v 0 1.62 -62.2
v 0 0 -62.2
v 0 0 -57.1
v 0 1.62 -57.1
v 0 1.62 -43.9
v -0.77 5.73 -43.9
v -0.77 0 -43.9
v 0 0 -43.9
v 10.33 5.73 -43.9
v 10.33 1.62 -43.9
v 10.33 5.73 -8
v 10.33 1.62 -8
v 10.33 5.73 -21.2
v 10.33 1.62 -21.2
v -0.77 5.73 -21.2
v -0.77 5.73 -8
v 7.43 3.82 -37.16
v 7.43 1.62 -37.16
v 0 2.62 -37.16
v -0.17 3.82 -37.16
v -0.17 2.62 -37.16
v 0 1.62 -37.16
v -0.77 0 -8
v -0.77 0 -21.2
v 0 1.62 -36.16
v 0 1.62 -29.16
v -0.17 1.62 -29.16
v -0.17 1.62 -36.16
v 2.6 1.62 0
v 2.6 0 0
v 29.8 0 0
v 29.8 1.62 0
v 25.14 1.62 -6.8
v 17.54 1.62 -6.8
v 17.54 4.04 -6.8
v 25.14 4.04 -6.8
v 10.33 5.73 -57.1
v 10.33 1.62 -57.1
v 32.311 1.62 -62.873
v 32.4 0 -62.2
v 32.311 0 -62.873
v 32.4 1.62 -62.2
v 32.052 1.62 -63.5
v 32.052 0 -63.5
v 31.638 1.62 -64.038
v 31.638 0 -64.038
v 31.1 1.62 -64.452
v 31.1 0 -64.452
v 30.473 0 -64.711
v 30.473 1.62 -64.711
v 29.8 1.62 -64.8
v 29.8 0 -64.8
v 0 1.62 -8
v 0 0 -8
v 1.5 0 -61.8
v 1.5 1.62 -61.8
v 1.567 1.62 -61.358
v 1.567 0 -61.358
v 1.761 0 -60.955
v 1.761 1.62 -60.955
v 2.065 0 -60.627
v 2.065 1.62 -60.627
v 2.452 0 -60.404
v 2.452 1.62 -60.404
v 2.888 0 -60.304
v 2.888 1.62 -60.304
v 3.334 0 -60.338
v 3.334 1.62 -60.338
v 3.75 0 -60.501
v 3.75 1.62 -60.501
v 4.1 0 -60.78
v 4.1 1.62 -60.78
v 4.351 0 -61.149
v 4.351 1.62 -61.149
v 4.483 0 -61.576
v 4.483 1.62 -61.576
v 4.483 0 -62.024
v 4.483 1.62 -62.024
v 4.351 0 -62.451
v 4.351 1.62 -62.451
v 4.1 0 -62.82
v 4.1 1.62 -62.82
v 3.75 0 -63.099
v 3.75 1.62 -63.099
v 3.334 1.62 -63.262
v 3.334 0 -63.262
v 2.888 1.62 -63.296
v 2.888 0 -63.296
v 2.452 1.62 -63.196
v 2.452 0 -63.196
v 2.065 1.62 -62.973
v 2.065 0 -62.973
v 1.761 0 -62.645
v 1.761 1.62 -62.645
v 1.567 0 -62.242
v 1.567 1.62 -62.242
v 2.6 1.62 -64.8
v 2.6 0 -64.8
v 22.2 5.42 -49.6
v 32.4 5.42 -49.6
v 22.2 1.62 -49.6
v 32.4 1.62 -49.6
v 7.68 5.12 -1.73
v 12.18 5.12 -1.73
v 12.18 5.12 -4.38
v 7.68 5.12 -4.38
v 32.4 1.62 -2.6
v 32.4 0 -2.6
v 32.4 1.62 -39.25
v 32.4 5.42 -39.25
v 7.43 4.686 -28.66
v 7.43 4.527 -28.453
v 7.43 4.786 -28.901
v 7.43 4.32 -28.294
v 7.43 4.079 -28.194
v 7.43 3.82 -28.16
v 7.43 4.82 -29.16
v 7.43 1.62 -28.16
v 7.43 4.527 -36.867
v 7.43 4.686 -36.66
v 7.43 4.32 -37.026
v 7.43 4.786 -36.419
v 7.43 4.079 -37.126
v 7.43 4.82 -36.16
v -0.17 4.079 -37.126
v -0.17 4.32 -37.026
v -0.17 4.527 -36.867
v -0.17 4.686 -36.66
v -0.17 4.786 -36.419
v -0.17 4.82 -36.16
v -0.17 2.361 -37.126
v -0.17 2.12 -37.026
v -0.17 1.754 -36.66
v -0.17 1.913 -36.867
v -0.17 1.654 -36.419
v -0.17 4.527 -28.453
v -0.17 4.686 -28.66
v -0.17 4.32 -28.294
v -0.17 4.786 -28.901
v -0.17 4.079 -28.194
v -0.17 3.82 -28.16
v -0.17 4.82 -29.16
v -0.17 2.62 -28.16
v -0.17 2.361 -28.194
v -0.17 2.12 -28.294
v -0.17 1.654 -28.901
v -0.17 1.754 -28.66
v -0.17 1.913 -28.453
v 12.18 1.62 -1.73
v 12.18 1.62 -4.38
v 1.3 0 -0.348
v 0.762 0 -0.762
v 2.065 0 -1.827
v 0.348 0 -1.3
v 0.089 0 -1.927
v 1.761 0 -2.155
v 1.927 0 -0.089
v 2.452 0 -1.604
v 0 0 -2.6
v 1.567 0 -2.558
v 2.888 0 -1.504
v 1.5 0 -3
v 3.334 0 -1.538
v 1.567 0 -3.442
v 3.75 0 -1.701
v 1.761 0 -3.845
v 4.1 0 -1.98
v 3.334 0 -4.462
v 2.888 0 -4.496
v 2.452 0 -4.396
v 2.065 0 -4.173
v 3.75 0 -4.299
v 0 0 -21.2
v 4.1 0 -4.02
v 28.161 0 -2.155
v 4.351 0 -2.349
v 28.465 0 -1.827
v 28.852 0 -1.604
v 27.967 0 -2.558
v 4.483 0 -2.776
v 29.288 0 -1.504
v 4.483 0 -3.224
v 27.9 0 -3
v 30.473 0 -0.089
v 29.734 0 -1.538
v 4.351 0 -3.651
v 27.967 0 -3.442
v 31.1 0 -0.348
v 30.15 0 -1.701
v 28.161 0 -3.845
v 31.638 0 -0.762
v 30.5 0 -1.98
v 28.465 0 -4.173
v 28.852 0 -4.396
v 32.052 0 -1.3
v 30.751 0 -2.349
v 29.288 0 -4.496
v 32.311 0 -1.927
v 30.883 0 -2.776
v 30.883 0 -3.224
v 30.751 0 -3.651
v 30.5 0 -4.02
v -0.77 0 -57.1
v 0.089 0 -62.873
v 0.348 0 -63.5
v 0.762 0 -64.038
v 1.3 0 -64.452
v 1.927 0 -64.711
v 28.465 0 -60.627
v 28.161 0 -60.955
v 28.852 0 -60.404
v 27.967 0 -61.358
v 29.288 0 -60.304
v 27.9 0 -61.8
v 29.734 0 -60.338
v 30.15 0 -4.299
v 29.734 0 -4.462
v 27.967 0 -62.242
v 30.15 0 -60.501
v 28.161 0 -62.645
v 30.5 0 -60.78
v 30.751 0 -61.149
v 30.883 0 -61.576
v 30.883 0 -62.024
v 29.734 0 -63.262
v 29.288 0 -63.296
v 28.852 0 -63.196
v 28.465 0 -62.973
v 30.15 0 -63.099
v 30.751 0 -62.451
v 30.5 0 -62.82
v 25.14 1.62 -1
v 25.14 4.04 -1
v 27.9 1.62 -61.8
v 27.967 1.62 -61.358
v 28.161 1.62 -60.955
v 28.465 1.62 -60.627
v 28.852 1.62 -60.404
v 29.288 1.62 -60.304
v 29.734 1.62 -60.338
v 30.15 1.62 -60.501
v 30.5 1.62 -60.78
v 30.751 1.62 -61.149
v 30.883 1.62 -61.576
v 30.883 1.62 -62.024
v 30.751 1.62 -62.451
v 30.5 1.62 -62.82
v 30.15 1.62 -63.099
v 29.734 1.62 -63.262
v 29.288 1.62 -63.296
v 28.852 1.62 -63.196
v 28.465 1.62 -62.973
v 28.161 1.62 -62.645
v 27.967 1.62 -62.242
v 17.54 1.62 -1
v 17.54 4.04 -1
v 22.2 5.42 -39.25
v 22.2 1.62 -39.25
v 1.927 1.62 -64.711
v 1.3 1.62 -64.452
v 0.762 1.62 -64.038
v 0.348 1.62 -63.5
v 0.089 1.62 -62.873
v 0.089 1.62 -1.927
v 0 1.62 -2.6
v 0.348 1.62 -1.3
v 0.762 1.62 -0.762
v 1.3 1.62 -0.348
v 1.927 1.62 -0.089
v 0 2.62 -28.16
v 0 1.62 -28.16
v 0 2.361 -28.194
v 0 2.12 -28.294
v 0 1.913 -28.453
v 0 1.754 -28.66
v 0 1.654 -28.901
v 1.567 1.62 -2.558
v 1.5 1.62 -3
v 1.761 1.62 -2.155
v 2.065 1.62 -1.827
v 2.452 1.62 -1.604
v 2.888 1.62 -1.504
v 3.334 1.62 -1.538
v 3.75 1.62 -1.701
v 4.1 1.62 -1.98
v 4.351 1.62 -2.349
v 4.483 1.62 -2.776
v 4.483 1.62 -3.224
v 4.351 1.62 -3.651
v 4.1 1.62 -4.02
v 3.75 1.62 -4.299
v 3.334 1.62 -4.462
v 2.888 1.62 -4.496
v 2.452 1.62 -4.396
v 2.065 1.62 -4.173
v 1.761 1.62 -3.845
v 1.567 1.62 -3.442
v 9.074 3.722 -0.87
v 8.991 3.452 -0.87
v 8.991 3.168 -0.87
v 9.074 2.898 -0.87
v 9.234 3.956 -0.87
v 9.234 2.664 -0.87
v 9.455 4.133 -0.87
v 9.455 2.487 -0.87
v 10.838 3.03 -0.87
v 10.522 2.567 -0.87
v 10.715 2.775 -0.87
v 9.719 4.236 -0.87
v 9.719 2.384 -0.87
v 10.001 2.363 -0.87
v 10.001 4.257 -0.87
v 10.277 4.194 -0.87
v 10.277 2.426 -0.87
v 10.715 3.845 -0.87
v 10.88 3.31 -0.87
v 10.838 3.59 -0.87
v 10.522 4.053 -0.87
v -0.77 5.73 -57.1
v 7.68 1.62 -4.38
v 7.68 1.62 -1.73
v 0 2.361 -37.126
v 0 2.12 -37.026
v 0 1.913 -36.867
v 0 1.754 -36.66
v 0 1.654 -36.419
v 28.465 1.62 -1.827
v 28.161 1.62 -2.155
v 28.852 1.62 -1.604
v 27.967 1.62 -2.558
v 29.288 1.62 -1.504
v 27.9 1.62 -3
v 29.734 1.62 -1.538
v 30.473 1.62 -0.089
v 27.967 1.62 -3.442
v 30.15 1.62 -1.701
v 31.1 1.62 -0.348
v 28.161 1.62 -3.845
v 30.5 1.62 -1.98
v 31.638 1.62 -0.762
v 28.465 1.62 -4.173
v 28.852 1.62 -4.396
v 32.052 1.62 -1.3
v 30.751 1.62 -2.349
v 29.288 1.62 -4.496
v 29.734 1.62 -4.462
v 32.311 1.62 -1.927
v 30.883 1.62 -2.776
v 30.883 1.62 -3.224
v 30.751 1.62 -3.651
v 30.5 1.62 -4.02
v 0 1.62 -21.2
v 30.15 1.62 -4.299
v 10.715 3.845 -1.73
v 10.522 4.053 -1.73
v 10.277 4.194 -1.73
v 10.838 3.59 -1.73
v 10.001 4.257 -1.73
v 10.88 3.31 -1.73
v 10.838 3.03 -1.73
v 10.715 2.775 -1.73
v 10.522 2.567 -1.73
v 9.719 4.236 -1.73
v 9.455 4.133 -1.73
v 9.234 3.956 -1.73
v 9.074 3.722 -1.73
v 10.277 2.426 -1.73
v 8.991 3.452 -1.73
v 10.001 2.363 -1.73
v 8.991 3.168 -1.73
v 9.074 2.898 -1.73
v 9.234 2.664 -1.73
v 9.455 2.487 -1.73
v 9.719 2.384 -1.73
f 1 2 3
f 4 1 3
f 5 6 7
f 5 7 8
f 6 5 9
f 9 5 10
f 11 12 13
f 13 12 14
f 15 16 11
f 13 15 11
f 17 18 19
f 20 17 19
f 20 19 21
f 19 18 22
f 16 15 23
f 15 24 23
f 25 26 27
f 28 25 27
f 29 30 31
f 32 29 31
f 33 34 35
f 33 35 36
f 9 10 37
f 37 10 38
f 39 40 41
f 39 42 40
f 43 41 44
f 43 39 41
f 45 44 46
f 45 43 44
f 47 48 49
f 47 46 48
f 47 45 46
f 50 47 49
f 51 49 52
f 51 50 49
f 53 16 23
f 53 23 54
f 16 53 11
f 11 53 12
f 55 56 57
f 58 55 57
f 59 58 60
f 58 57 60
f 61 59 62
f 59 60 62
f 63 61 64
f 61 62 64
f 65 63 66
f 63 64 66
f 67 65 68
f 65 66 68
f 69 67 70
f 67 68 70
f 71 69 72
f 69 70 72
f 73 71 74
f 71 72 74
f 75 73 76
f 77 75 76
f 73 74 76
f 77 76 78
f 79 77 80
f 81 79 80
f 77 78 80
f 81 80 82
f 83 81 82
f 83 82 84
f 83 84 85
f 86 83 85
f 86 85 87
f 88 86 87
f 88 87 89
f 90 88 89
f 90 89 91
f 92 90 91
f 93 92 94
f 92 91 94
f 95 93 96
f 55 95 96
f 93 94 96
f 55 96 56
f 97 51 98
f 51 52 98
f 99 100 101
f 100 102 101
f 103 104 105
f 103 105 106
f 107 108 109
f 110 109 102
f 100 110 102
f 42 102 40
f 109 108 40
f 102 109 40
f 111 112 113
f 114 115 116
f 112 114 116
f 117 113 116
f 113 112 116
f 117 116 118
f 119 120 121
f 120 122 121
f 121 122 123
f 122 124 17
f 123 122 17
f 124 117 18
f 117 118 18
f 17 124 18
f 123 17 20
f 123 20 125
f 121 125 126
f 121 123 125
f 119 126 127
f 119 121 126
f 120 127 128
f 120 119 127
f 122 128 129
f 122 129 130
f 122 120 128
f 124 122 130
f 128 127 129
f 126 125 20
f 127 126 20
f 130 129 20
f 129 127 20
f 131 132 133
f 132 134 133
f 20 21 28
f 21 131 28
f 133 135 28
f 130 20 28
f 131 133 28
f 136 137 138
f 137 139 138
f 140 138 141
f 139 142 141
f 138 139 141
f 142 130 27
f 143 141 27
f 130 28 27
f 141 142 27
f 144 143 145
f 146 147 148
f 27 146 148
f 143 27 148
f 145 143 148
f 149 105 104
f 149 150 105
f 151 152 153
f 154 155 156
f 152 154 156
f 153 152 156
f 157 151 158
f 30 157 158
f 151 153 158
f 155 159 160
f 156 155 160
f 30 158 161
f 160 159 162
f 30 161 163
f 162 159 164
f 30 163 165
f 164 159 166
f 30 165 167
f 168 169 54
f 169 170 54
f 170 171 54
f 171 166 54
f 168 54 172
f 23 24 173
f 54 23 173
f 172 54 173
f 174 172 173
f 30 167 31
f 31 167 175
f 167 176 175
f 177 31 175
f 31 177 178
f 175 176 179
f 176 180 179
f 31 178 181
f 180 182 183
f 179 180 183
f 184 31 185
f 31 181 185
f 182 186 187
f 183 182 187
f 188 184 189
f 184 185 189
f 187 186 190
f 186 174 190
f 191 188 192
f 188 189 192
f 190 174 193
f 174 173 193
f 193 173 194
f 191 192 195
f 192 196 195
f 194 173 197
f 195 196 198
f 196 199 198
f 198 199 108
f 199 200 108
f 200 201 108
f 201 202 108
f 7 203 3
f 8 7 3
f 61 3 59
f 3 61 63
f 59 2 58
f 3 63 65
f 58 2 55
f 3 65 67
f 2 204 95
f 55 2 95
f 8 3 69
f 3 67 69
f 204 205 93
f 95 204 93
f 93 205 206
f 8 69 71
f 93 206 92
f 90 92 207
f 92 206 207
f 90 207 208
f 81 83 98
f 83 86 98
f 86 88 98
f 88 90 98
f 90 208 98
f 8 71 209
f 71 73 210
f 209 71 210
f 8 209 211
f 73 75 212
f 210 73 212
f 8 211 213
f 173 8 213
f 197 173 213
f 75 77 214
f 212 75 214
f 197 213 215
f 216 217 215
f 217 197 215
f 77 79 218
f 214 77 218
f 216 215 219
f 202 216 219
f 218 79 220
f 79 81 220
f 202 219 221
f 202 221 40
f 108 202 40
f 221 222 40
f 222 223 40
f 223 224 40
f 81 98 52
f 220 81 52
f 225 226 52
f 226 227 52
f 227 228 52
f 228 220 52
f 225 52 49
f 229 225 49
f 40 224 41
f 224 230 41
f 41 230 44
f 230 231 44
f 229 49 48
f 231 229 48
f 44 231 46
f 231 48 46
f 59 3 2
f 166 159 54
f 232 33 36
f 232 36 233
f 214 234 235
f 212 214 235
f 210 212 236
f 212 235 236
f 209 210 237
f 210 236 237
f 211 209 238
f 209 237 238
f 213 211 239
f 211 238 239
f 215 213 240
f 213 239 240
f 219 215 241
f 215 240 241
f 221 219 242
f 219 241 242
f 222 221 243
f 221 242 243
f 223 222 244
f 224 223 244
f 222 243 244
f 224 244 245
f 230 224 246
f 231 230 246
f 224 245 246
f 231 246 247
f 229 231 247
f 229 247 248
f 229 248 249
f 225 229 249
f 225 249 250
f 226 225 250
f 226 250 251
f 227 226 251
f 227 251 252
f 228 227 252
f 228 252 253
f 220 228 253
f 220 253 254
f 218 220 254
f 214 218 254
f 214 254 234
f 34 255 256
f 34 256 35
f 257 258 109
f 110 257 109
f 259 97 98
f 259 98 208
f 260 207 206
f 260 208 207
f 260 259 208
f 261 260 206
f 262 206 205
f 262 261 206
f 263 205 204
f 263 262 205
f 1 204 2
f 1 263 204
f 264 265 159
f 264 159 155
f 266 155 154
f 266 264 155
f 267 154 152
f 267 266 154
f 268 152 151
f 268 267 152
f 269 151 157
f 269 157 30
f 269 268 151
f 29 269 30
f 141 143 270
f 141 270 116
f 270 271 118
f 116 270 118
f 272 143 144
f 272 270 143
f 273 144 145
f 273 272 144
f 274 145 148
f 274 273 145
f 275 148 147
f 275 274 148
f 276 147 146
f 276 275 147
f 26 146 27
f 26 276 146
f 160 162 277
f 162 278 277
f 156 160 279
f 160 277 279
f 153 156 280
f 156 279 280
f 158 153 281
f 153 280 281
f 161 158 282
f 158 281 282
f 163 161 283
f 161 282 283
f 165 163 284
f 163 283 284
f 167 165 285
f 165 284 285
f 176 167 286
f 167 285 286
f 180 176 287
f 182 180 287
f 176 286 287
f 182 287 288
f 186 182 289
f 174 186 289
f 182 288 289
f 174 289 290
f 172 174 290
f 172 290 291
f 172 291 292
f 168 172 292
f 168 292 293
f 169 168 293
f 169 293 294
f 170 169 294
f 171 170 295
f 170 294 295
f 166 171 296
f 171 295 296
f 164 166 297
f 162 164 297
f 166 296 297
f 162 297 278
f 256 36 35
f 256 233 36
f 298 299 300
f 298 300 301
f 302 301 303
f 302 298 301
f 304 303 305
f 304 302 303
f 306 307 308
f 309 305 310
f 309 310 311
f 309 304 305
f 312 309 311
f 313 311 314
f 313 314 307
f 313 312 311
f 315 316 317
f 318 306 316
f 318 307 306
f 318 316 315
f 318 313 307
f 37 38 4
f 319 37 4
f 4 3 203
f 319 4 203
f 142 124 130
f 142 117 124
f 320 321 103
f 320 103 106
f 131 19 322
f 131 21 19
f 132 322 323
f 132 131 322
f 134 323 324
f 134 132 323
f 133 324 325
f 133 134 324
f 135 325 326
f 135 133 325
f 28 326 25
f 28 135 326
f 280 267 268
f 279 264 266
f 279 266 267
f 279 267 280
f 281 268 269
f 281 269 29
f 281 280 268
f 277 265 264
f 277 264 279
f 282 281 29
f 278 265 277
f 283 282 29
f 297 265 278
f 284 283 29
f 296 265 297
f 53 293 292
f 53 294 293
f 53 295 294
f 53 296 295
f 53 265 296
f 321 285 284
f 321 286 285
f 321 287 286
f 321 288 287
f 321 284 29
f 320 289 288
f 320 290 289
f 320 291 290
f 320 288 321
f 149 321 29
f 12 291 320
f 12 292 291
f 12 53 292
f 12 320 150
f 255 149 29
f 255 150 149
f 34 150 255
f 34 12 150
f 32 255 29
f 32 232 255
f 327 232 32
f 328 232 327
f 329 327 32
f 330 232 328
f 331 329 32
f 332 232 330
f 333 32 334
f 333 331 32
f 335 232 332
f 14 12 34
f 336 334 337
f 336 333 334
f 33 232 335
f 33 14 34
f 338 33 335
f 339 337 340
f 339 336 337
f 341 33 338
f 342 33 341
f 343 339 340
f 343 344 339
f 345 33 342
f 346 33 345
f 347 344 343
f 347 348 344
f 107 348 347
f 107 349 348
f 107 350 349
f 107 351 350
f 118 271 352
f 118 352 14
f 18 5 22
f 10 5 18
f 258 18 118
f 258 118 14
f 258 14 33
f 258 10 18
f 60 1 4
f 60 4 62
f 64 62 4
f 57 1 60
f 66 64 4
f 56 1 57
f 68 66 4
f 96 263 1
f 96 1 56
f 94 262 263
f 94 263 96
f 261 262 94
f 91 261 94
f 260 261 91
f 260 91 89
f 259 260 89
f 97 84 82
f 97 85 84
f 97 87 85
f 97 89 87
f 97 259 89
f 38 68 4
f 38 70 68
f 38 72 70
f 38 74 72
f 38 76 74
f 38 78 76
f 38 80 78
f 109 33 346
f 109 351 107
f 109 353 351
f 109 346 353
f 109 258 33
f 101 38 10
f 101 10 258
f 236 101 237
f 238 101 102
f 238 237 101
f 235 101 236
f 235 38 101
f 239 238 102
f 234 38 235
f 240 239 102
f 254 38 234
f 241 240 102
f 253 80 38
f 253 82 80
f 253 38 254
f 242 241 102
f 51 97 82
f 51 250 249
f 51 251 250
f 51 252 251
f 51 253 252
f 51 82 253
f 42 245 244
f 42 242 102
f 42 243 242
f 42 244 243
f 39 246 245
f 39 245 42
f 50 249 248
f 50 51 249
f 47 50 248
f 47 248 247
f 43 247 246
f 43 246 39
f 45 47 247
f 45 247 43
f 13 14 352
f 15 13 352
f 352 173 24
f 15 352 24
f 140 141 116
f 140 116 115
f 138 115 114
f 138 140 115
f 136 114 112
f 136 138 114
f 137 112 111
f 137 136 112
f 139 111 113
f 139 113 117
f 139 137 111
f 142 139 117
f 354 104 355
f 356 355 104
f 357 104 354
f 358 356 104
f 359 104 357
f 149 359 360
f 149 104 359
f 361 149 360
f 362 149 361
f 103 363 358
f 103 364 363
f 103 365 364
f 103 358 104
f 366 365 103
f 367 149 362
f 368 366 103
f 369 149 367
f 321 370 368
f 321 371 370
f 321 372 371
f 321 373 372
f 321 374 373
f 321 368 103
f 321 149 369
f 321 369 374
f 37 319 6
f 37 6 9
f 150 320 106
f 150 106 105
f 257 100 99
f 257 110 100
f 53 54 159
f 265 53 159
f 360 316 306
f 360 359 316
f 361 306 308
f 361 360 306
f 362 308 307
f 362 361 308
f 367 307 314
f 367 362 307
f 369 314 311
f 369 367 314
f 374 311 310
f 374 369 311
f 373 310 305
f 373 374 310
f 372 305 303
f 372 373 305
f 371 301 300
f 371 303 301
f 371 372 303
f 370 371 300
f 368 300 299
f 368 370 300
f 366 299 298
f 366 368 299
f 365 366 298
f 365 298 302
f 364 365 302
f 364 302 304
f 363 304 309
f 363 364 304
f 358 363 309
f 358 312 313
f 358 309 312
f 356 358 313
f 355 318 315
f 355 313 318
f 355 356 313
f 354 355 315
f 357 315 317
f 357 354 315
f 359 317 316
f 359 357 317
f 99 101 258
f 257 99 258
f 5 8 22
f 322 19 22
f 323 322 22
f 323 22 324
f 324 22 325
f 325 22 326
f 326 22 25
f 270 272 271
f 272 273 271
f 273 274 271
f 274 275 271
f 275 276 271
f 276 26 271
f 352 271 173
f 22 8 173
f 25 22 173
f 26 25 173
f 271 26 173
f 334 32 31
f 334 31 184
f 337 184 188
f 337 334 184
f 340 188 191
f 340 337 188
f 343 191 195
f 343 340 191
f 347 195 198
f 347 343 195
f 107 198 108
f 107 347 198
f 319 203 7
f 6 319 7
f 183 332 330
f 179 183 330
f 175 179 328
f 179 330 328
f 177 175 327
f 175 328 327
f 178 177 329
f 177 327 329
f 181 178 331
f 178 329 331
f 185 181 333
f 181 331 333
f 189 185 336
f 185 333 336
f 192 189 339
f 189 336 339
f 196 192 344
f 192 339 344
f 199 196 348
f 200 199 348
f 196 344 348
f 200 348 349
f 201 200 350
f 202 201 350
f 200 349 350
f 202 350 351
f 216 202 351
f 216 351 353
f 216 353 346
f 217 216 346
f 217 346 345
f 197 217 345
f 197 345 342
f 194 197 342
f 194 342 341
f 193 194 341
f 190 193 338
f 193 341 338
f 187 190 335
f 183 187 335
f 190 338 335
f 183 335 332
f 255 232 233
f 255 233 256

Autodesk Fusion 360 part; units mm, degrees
sketch "Sketch1" plane through (0, 0, 0) normal (0, 1, 0) x (1, 0, 0)
  line L0 (0, 0) -> (32.4, 0)
  line L1 (32.4, 0) -> (32.4, 64.8)
  line L2 (32.4, 64.8) -> (0, 64.8)
  line L3 (0, 64.8) -> (0, 0)
  dimension "d1" = 64.8
  dimension "d2" = 32.4
extrude "Extrude1" add sketch "Sketch1" along normal blind 1.62
fillet "Fillet1" radius 2.6 4 edges at (0, 0.81, 0) (32.4, 0.81, 0) (0, 0.81, -64.8) (32.4, 0.81, -64.8)
sketch "Sketch2" plane through (0, 1.62, 0) normal (0, 1, 0) x (-1, 0, 0)
  circle A0 centre (-3, -3) radius 1.5
  circle A1 centre (-29.4, -3) radius 1.5
  circle A2 centre (-29.4, -61.8) radius 1.5
  circle A3 centre (-3, -61.8) radius 1.5
  line L0 (-29.8, -64.8) -> (-2.6, -64.8)
  line L1 (0, -62.2) -> (0, -2.6)
  line L2 (-32.4, -2.6) -> (-32.4, -62.2)
  line L3 (-2.6, 0) -> (-29.8, 0)
  dimension "d6" = 3
  dimension "d7" = 3
  dimension "d8" = 3
  dimension "d9" = 3
  dimension "d10" = 3
extrude "Extrude2" cut sketch "Sketch2" against normal blind 5
sketch "Sketch3" plane through (0, 0, 0) normal (0, -1, 0) x (1, 0, 0)
  line L0 (10.33, -57.1) -> (-0.77, -57.1)
  line L1 (-0.77, -57.1) -> (-0.77, -43.9)
  line L2 (-0.77, -43.9) -> (10.33, -43.9)
  line L3 (10.33, -43.9) -> (10.33, -57.1)
  line L4 (10.33, -21.2) -> (-0.77, -21.2)
  line L5 (-0.77, -21.2) -> (-0.77, -8)
  line L6 (-0.77, -8) -> (10.33, -8)
  line L7 (10.33, -8) -> (10.33, -21.2)
  line L8 (29.8, -64.8) -> (2.6, -64.8)
  line L9 (2.6, 0) -> (29.8, 0)
  line L10 (0, -62.2) -> (0, -2.6)
  dimension "d13" = 13.2
  dimension "d14" = 11.1
  dimension "d15" = 7.7
  dimension "d16" = 8
  dimension "d17" = 0.77
extrude "Extrude3" add sketch "Sketch3" against normal blind 5.73
sketch "Sketch4" plane through (0, 1.62, 0) normal (0, 1, 0) x (-1, 0, 0)
  line L0 (-22.2, -39.25) -> (-32.4, -39.25)
  line L1 (-32.4, -39.25) -> (-32.4, -49.6)
  line L2 (-32.4, -49.6) -> (-22.2, -49.6)
  line L3 (-22.2, -49.6) -> (-22.2, -39.25)
  line L4 (-29.8, -64.8) -> (-2.6, -64.8)
  point P0 (-32.4, -62.2)
  dimension "d20" = 10.35
  dimension "d21" = 10.2
  dimension "d22" = 15.2
extrude "Extrude4" add sketch "Sketch4" along normal blind 3.8
sketch "Sketch5" plane through (0, 1.62, 0) normal (0, 1, 0) x (-1, 0, 0)
  line L0 (-7.43, -37.16) -> (0.17, -37.16)
  line L1 (0.17, -37.16) -> (0.17, -28.16)
  line L2 (0.17, -28.16) -> (-7.43, -28.16)
  line L3 (-7.43, -28.16) -> (-7.43, -37.16)
  line L4 (0, -43.9) -> (0, -21.2)
  line L5 (-10.33, -43.9) -> (0, -43.9)
  dimension "d25" = 9
  dimension "d26" = 7.6
  dimension "d27" = 0.17
  dimension "d28" = 6.74
extrude "Extrude5" add sketch "Sketch5" along normal blind 3.2
fillet "Fillet2" radius 1 4 edges at (-0.085, 1.62, -28.16) (3.63, 4.82, -28.16) (3.63, 4.82, -37.16) (-0.085, 1.62, -37.16)
sketch "Sketch6" plane through (0, 1.62, 0) normal (0, 1, 0) x (-1, 0, 0)
  line L0 (-7.68, -4.38) -> (-12.18, -4.38)
  line L1 (-12.18, -4.38) -> (-12.18, -1.73)
  line L2 (-12.18, -1.73) -> (-7.68, -1.73)
  line L3 (-7.68, -1.73) -> (-7.68, -4.38)
  line L4 (-2.6, 0) -> (-29.8, 0)
  line L5 (0, -8) -> (0, -2.6)
  dimension "d32" = 4.5
  dimension "d33" = 2.65
  dimension "d34" = 1.73
  dimension "d35" = 7.68
extrude "Extrude6" add sketch "Sketch6" along normal blind 3.5
sketch "Sketch7" plane through (0, 0, -1.73) normal (0, 0, 1) x (1, 0, 0)
  circle A0 centre (9.93, 3.31) radius 0.95
  line L0 (7.68, 5.12) -> (12.18, 5.12)
  point P0 (9.93, 5.12)
  dimension "d38" = 1.9
  dimension "d39" = 1.81
extrude "Extrude7" add sketch "Sketch7" along normal blind 0.86
sketch "Sketch8" plane through (0, 1.62, 0) normal (0, 1, 0) x (-1, 0, 0)
  line L0 (-17.54, -6.8) -> (-25.14, -6.8)
  line L1 (-25.14, -6.8) -> (-25.14, -1)
  line L2 (-25.14, -1) -> (-17.54, -1)
  line L3 (-17.54, -1) -> (-17.54, -6.8)
  line L4 (-2.6, 0) -> (-29.8, 0)
  line L5 (-32.4, -2.6) -> (-32.4, -39.25)
  dimension "d42" = 5.8
  dimension "d43" = 7.6
  dimension "d44" = 1
  dimension "d45" = 7.26
extrude "Extrude8" add sketch "Sketch8" along normal blind 2.42
equation "d7 = 1.5 mm + d6 / 2"
equation "d8 = d7"
equation "d9 = d7"
equation "d10 = d7"
equation "d18 = -1 * ( 4.11 mm + 1.62 mm )"
equation "d39 = 0.86 mm + d38 / 2"
